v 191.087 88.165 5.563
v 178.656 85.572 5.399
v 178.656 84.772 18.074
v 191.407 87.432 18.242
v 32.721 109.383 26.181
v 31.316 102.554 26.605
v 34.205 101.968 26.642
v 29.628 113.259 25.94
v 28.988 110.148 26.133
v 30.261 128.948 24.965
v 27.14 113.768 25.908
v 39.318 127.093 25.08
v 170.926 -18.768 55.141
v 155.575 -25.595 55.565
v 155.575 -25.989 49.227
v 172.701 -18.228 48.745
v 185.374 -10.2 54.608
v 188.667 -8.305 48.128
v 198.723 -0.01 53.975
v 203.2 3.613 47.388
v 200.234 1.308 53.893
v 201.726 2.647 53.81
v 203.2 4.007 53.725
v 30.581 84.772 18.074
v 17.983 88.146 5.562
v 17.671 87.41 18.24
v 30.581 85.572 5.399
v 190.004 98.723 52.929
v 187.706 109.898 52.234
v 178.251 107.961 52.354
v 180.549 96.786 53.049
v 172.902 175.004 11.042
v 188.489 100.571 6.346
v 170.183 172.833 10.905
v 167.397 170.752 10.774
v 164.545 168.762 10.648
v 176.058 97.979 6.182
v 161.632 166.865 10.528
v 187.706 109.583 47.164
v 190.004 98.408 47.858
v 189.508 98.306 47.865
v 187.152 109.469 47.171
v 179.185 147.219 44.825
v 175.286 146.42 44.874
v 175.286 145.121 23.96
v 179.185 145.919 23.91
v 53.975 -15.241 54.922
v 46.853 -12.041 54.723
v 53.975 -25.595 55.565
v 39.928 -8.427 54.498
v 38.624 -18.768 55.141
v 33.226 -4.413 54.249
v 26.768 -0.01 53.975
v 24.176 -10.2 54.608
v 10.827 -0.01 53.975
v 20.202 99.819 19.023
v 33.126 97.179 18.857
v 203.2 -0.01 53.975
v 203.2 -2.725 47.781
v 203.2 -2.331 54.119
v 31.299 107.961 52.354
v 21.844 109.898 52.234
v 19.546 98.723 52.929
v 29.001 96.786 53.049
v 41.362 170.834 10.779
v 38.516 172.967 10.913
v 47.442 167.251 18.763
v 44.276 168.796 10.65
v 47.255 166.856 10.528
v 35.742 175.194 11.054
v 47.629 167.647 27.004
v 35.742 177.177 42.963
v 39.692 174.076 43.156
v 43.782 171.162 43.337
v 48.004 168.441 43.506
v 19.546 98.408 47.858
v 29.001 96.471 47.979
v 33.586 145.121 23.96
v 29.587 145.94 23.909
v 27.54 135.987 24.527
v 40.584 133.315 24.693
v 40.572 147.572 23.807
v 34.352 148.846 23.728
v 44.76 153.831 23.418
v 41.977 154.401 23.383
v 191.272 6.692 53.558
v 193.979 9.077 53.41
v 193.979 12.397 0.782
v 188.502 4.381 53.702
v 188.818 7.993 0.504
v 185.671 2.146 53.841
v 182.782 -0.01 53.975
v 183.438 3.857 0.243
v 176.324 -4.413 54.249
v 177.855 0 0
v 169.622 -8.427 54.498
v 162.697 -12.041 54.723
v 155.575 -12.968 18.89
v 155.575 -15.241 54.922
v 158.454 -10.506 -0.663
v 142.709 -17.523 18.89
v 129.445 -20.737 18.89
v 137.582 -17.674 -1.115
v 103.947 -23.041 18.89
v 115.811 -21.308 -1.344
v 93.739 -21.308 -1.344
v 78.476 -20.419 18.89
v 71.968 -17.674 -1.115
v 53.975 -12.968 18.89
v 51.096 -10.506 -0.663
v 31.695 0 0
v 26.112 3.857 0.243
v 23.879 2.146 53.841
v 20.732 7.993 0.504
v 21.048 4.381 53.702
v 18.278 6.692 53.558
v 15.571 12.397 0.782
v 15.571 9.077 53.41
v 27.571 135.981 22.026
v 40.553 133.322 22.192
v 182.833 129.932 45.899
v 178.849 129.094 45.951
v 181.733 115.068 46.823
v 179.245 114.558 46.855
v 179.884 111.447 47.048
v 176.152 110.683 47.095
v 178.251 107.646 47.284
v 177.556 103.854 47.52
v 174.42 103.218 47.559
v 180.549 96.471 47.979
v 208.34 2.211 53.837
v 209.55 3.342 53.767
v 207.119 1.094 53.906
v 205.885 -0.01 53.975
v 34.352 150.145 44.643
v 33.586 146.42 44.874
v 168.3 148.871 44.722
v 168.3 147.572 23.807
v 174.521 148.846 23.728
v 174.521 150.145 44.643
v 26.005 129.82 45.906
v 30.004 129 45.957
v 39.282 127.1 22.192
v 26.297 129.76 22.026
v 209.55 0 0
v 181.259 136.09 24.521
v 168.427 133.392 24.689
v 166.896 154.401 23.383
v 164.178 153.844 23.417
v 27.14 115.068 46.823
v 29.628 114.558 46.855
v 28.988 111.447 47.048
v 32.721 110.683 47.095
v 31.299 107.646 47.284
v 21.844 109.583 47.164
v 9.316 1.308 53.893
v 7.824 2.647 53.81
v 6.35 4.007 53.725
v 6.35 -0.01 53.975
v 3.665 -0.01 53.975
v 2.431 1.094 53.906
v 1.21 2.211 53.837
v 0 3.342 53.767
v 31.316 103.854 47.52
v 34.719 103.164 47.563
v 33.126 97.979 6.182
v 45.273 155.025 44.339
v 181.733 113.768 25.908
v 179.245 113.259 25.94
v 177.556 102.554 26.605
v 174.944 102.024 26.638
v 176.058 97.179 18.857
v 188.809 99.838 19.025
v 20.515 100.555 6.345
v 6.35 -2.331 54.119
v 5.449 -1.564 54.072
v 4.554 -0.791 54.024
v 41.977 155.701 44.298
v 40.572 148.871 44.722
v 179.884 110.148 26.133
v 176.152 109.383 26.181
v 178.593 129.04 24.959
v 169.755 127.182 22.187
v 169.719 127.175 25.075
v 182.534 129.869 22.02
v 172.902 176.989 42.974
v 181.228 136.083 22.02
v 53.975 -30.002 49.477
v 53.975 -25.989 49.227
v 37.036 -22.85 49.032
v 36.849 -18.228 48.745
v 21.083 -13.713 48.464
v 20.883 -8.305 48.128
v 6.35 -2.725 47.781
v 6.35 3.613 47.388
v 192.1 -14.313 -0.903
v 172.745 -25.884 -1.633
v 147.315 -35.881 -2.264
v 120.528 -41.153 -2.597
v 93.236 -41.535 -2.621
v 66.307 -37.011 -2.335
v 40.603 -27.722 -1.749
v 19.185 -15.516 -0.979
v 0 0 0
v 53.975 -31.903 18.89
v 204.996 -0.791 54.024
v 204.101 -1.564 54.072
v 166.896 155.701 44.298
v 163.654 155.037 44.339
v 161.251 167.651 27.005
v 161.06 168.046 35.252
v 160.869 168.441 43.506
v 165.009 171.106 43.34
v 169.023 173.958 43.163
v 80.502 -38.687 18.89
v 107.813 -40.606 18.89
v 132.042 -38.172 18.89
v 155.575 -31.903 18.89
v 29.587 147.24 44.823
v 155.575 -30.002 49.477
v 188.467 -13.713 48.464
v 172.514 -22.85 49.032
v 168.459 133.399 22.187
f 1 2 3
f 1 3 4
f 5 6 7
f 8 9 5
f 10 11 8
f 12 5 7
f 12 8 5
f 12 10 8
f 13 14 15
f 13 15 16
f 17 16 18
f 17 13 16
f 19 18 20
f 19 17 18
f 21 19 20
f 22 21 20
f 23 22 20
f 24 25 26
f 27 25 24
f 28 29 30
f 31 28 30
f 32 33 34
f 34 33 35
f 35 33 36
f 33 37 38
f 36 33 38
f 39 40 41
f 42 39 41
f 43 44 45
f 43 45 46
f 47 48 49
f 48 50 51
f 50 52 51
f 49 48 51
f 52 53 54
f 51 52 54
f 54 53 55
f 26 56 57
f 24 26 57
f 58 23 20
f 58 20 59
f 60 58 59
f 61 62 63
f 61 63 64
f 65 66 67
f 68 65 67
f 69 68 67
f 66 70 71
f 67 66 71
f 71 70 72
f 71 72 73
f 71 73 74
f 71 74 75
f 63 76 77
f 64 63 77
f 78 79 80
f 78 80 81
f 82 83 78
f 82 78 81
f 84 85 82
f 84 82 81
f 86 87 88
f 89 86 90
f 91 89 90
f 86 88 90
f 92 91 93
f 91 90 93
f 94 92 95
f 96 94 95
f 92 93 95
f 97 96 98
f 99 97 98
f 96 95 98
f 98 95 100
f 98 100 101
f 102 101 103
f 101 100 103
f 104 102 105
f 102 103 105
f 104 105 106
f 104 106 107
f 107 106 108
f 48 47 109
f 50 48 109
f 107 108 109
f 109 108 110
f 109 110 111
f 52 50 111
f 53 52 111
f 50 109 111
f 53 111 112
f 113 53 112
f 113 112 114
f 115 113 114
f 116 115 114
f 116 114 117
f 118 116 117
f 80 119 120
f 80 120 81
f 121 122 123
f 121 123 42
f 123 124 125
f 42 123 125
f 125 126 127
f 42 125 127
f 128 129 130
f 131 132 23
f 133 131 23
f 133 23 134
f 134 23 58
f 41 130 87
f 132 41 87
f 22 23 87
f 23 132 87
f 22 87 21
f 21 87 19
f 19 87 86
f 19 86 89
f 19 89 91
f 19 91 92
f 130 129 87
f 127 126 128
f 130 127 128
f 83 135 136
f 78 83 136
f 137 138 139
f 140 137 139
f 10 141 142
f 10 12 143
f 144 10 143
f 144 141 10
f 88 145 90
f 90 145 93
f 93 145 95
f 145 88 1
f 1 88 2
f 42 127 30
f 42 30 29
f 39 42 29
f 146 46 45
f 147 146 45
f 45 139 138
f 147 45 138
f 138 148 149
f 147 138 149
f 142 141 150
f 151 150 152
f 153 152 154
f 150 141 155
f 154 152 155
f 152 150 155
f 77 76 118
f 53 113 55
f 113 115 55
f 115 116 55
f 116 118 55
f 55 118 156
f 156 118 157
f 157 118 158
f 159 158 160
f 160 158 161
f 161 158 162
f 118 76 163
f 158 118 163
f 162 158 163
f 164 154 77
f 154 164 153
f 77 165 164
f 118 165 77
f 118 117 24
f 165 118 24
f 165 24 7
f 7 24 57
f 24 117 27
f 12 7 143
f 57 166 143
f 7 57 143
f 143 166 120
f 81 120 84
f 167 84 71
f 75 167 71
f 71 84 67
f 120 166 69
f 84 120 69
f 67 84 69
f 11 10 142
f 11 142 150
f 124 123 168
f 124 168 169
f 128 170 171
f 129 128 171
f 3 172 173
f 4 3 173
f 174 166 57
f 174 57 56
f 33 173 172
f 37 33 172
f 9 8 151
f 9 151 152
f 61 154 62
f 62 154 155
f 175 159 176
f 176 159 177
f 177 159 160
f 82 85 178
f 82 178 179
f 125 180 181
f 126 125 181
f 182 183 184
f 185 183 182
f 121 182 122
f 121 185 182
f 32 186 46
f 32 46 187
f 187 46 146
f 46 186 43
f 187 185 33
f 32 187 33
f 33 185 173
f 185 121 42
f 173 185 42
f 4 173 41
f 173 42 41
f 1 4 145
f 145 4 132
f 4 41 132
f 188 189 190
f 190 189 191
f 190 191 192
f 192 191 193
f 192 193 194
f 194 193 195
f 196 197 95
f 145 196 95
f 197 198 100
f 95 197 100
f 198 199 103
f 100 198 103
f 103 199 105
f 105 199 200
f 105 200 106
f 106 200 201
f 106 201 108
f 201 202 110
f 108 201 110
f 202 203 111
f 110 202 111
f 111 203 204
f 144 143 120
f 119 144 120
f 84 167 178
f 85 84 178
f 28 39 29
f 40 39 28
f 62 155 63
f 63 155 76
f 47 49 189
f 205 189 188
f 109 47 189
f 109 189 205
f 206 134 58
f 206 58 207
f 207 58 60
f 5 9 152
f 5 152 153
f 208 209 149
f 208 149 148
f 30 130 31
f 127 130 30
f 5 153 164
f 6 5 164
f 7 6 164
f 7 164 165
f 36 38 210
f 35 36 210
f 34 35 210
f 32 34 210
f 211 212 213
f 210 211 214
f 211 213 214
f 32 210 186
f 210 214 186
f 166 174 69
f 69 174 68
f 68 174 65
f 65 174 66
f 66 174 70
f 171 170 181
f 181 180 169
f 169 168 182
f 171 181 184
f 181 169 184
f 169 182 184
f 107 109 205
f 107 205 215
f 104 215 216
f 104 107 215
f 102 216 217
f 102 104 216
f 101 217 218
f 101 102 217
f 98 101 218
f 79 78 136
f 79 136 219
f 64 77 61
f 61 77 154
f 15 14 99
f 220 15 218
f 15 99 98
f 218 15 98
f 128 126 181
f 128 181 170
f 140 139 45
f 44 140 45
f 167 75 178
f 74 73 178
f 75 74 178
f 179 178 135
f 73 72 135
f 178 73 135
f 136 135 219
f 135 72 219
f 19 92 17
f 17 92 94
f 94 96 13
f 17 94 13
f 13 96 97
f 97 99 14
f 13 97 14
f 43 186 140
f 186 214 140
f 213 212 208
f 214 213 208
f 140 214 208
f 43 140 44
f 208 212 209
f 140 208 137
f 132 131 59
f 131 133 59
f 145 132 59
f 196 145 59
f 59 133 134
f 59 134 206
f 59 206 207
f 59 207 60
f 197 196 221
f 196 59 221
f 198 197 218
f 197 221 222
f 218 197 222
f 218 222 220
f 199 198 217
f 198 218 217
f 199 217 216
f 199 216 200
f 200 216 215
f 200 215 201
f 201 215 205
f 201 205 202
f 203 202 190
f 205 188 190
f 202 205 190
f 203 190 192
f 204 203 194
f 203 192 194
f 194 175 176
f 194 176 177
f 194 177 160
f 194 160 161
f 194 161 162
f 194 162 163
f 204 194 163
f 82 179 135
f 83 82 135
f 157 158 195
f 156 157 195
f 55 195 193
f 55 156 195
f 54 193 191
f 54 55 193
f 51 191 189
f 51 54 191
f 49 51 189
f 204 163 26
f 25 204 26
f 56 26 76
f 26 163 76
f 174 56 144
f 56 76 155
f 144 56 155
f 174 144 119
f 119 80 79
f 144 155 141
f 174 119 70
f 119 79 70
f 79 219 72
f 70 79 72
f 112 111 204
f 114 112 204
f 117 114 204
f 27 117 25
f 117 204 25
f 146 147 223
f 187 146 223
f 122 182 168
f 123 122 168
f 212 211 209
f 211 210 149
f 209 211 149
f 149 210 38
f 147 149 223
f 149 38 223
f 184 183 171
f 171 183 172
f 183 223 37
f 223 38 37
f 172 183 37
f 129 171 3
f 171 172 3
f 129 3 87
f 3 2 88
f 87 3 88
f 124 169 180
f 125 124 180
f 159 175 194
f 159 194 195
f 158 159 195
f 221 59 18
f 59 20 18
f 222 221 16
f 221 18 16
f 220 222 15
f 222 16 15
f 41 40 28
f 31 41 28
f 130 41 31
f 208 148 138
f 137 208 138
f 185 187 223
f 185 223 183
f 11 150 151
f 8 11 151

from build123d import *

# Parameters (mm, degrees)
BOSS_EXTRUDE1_DEPTH     = 209.55
SKETCH3_W               = 240.510539239
SKETCH3_H               = 265.315522901
CUT_EXTRUDE1_DEPTH      = 61.780833862
CUT_EXTRUDE2_DEPTH      = 59.88645018
CUT_EXTRUDE3_DEPTH      = 12.7
CUT_EXTRUDE4_DEPTH      = 6.35
SKETCH7_W               = 101.6
SKETCH7_H               = 37.465
CUT_EXTRUDE5_DEPTH      = 178.176697197
CUT_EXTRUDE5_DEPTH_BACK = 42.974613266
SKETCH10_R              = 2.667
CUT_EXTRUDE8_DEPTH      = 50.8
SKETCH11_R              = 2.667
CUT_EXTRUDE9_DEPTH      = 50.8
BOSS_EXTRUDE2_DEPTH     = 5.08
CUT_EXTRUDE10_DEPTH     = 19.05
CUT_EXTRUDE11_DEPTH     = 19.05
CUT_EXTRUDE12_DEPTH     = 20.955


with BuildPart() as part:
    # Sketch2 → Boss-Extrude1 (new body)
    with BuildSketch(Plane(origin=(0, 0, 0), x_dir=(0, 0, -1), z_dir=(1, 0, 0))):
        Polygon((-42.945985173, 177.447146824), (-53.974998987, -0.010456153), (-57.520039142, -57.050399967), (3.378068797, -53.539609111), (0, 0), (-11.195985173, 177.447146824), align=None)
    extrude(amount=BOSS_EXTRUDE1_DEPTH)

    # Sketch3 → Cut-Extrude1 (cut, through all)
    with BuildSketch(Plane(origin=(0, 3.341605618, 53.766667899), x_dir=(1, 0, 0), z_dir=(0, 0.062030449, 0.998074257))):
        with Locations((107.411926899, 58.645471754)):
            Rectangle(SKETCH3_W, SKETCH3_H)
        with BuildLine():
            Line((172.901684058, 173.982013262), (209.55, 0))
            ThreePointArc((209.55, 0), (104.775, -41.729500882), (0, 0))
            Line((0, 0), (35.741813567, 174.170499118))
            ThreePointArc((35.741813567, 174.170499118), (104.287966167, 149.492856038), (172.901684058, 173.982013262))
        make_face(mode=Mode.SUBTRACT)
    extrude(amount=-CUT_EXTRUDE1_DEPTH, mode=Mode.SUBTRACT)

    # Sketch4 → Cut-Extrude2 (cut, through all)
    with BuildSketch(Plane(origin=(0, 0, 0), x_dir=(-1, 0, 0), z_dir=(0, 0.062969545, -0.998015449))):
        with BuildLine():
            Line((-160.868955232, 170.846287594), (-193.979445404, 12.421844718))
            ThreePointArc((-193.979445404, 12.421844718), (-104.775, -21.808079515), (-15.570554596, 12.421844718))
            Line((-15.570554596, 12.421844718), (-48.003667802, 170.846287594))
            Line((-48.003667802, 170.846287594), (-160.868955232, 170.846287594))
        make_face()
    extrude(amount=-CUT_EXTRUDE2_DEPTH, mode=Mode.SUBTRACT)

    # Sketch5 → Cut-Extrude3 (cut)
    with BuildSketch(Plane(origin=(0, 0, 0), x_dir=(-1, 0, 0), z_dir=(0, 0.062969545, -0.998015449))):
        Polygon((-189.575592117, 100.998599654), (-176.057501646, 98.17333738), (-178.65564658, 85.741939916), (-192.173737051, 88.56720219), align=None)
        Polygon((-33.125849843, 98.17333738), (-19.492211444, 100.964455529), (-16.94721956, 88.533058065), (-30.58085796, 85.741939916), align=None)
    extrude(amount=-CUT_EXTRUDE3_DEPTH, mode=Mode.SUBTRACT)

    # Sketch6 → Cut-Extrude4 (cut)
    with BuildSketch(Plane(origin=(0, 3.341605618, 53.766667899), x_dir=(1, 0, 0), z_dir=(0, 0.062030449, 0.998074257))):
        with BuildLine():
            Line((6.35, -5.683612864), (6.35, 0.666387136))
            ThreePointArc((6.35, 0.666387136), (104.775, -38.257263578), (203.2, 0.666387136))
            Line((203.2, 0.666387136), (203.2, -5.683612864))
            ThreePointArc((203.2, -5.683612864), (104.775, -41.729500882), (6.35, -5.683612864))
        make_face()
    extrude(amount=-CUT_EXTRUDE4_DEPTH, mode=Mode.SUBTRACT)

    # Sketch7 → Cut-Extrude5 (cut, two sides)
    with BuildSketch(Plane(origin=(0, 0, 0), x_dir=(1, 0, 0), z_dir=(0, 1, 0))) as cut_extrude5_sk:
        with Locations((104.775, -37.622667571)):
            Rectangle(SKETCH7_W, SKETCH7_H)
    extrude(amount=CUT_EXTRUDE5_DEPTH, mode=Mode.SUBTRACT)
    extrude(cut_extrude5_sk.sketch, amount=-CUT_EXTRUDE5_DEPTH_BACK, mode=Mode.SUBTRACT)

    # Sketch10 → Cut-Extrude8 (cut)
    with BuildSketch(Plane(origin=(200.647085604, 42.183769093, -2.621726904), x_dir=(-0.012512246, -0.002630558, -0.999918259), z_dir=(0.978526509, 0.205724076, -0.012785779))):
        with Locations(Location((-34.774476568, 102.235809265, 0), (0, 0, 90))):  # turned: the seam where the file's is
            Circle(SKETCH10_R)
    extrude(amount=-CUT_EXTRUDE8_DEPTH, mode=Mode.SUBTRACT)

    # Sketch11 → Cut-Extrude9 (cut)
    with BuildSketch(Plane(origin=(0, 0, 0), x_dir=(-0.012215925, 0.002502022, 0.999922253), z_dir=(-0.979586609, 0.200635456, -0.01246952))):
        with Locations(Location((32.158429543, 145.097393201, 0), (0, 0, 270))):  # turned: the seam where the file's is
            Circle(SKETCH11_R)
    extrude(amount=-CUT_EXTRUDE9_DEPTH, mode=Mode.SUBTRACT)

    # Sketch13 → Boss-Extrude2 (add)
    with BuildSketch(Plane(origin=(0, 3.341605618, 53.766667899), x_dir=(1, 0, 0), z_dir=(0, 0.062030449, 0.998074257))):
        Polygon((21.844, 106.446204126), (19.546311985, 95.249529182), (29.001281937, 93.309259303), (31.298969952, 104.505934246), align=None)
        Polygon((178.251030048, 104.505934246), (187.706, 106.446204126), (190.003688015, 95.249529182), (180.548718063, 93.309259303), align=None)
    extrude(amount=BOSS_EXTRUDE2_DEPTH)

    # Sketch14 → Cut-Extrude10 (cut)
    with BuildSketch(Plane(origin=(0, 0, 0), x_dir=(-0.012215925, 0.002502022, 0.999922253), z_dir=(-0.979586609, 0.200635456, -0.01246952))):
        Polygon((45.523011798, 138.747393201), (45.909608937, 132.397393201), (22.028011798, 132.397393201), (22.028011798, 138.747393201), align=None)
    extrude(amount=-CUT_EXTRUDE10_DEPTH, mode=Mode.SUBTRACT)

    # Sketch15 → Cut-Extrude11 (cut)
    with BuildSketch(Plane(origin=(200.647085604, 42.183769093, -2.621726904), x_dir=(-0.012512246, -0.002630558, -0.999918259), z_dir=(0.978526509, 0.205724076, -0.012785779))):
        Polygon((-48.138588614, 95.885809265), (-24.643588614, 95.885809265), (-24.643588614, 89.535809265), (-48.52476738, 89.535809265), align=None)
    extrude(amount=-CUT_EXTRUDE11_DEPTH, mode=Mode.SUBTRACT)

    # Sketch16 → Cut-Extrude12 (cut)
    with BuildSketch(Plane(origin=(0, 3.341605618, 53.766667899), x_dir=(1, 0, 0), z_dir=(0, 0.062030449, 0.998074257))):
        Polygon((45.273381068, 151.976469085), (41.976582335, 152.653010556), (40.572439659, 145.81059809), (34.352064691, 147.087091432), (33.586168686, 143.354866451), (29.586519575, 144.175641), (27.283705248, 132.953985446), (31.283354359, 132.133210897), (27.13987731, 111.94197286), (29.628027298, 111.431375523), (28.988403038, 108.314475026), (32.720628019, 107.548579021), (31.316485344, 100.706166555), (34.718800408, 100.015076365), align=None)
        Polygon((174.153822626, 100.015076365), (163.599241965, 151.976469085), (166.896040699, 152.653010556), (168.300183374, 145.81059809), (174.520558343, 147.087091432), (175.286454348, 143.354866451), (179.286103459, 144.175641), (181.588917786, 132.953985446), (177.589268675, 132.133210897), (181.732745723, 111.94197286), (179.244595736, 111.431375523), (179.884219995, 108.314475026), (176.151995014, 107.548579021), (177.55613769, 100.706166555), align=None)
    extrude(amount=-CUT_EXTRUDE12_DEPTH, mode=Mode.SUBTRACT)


solid = part.part
